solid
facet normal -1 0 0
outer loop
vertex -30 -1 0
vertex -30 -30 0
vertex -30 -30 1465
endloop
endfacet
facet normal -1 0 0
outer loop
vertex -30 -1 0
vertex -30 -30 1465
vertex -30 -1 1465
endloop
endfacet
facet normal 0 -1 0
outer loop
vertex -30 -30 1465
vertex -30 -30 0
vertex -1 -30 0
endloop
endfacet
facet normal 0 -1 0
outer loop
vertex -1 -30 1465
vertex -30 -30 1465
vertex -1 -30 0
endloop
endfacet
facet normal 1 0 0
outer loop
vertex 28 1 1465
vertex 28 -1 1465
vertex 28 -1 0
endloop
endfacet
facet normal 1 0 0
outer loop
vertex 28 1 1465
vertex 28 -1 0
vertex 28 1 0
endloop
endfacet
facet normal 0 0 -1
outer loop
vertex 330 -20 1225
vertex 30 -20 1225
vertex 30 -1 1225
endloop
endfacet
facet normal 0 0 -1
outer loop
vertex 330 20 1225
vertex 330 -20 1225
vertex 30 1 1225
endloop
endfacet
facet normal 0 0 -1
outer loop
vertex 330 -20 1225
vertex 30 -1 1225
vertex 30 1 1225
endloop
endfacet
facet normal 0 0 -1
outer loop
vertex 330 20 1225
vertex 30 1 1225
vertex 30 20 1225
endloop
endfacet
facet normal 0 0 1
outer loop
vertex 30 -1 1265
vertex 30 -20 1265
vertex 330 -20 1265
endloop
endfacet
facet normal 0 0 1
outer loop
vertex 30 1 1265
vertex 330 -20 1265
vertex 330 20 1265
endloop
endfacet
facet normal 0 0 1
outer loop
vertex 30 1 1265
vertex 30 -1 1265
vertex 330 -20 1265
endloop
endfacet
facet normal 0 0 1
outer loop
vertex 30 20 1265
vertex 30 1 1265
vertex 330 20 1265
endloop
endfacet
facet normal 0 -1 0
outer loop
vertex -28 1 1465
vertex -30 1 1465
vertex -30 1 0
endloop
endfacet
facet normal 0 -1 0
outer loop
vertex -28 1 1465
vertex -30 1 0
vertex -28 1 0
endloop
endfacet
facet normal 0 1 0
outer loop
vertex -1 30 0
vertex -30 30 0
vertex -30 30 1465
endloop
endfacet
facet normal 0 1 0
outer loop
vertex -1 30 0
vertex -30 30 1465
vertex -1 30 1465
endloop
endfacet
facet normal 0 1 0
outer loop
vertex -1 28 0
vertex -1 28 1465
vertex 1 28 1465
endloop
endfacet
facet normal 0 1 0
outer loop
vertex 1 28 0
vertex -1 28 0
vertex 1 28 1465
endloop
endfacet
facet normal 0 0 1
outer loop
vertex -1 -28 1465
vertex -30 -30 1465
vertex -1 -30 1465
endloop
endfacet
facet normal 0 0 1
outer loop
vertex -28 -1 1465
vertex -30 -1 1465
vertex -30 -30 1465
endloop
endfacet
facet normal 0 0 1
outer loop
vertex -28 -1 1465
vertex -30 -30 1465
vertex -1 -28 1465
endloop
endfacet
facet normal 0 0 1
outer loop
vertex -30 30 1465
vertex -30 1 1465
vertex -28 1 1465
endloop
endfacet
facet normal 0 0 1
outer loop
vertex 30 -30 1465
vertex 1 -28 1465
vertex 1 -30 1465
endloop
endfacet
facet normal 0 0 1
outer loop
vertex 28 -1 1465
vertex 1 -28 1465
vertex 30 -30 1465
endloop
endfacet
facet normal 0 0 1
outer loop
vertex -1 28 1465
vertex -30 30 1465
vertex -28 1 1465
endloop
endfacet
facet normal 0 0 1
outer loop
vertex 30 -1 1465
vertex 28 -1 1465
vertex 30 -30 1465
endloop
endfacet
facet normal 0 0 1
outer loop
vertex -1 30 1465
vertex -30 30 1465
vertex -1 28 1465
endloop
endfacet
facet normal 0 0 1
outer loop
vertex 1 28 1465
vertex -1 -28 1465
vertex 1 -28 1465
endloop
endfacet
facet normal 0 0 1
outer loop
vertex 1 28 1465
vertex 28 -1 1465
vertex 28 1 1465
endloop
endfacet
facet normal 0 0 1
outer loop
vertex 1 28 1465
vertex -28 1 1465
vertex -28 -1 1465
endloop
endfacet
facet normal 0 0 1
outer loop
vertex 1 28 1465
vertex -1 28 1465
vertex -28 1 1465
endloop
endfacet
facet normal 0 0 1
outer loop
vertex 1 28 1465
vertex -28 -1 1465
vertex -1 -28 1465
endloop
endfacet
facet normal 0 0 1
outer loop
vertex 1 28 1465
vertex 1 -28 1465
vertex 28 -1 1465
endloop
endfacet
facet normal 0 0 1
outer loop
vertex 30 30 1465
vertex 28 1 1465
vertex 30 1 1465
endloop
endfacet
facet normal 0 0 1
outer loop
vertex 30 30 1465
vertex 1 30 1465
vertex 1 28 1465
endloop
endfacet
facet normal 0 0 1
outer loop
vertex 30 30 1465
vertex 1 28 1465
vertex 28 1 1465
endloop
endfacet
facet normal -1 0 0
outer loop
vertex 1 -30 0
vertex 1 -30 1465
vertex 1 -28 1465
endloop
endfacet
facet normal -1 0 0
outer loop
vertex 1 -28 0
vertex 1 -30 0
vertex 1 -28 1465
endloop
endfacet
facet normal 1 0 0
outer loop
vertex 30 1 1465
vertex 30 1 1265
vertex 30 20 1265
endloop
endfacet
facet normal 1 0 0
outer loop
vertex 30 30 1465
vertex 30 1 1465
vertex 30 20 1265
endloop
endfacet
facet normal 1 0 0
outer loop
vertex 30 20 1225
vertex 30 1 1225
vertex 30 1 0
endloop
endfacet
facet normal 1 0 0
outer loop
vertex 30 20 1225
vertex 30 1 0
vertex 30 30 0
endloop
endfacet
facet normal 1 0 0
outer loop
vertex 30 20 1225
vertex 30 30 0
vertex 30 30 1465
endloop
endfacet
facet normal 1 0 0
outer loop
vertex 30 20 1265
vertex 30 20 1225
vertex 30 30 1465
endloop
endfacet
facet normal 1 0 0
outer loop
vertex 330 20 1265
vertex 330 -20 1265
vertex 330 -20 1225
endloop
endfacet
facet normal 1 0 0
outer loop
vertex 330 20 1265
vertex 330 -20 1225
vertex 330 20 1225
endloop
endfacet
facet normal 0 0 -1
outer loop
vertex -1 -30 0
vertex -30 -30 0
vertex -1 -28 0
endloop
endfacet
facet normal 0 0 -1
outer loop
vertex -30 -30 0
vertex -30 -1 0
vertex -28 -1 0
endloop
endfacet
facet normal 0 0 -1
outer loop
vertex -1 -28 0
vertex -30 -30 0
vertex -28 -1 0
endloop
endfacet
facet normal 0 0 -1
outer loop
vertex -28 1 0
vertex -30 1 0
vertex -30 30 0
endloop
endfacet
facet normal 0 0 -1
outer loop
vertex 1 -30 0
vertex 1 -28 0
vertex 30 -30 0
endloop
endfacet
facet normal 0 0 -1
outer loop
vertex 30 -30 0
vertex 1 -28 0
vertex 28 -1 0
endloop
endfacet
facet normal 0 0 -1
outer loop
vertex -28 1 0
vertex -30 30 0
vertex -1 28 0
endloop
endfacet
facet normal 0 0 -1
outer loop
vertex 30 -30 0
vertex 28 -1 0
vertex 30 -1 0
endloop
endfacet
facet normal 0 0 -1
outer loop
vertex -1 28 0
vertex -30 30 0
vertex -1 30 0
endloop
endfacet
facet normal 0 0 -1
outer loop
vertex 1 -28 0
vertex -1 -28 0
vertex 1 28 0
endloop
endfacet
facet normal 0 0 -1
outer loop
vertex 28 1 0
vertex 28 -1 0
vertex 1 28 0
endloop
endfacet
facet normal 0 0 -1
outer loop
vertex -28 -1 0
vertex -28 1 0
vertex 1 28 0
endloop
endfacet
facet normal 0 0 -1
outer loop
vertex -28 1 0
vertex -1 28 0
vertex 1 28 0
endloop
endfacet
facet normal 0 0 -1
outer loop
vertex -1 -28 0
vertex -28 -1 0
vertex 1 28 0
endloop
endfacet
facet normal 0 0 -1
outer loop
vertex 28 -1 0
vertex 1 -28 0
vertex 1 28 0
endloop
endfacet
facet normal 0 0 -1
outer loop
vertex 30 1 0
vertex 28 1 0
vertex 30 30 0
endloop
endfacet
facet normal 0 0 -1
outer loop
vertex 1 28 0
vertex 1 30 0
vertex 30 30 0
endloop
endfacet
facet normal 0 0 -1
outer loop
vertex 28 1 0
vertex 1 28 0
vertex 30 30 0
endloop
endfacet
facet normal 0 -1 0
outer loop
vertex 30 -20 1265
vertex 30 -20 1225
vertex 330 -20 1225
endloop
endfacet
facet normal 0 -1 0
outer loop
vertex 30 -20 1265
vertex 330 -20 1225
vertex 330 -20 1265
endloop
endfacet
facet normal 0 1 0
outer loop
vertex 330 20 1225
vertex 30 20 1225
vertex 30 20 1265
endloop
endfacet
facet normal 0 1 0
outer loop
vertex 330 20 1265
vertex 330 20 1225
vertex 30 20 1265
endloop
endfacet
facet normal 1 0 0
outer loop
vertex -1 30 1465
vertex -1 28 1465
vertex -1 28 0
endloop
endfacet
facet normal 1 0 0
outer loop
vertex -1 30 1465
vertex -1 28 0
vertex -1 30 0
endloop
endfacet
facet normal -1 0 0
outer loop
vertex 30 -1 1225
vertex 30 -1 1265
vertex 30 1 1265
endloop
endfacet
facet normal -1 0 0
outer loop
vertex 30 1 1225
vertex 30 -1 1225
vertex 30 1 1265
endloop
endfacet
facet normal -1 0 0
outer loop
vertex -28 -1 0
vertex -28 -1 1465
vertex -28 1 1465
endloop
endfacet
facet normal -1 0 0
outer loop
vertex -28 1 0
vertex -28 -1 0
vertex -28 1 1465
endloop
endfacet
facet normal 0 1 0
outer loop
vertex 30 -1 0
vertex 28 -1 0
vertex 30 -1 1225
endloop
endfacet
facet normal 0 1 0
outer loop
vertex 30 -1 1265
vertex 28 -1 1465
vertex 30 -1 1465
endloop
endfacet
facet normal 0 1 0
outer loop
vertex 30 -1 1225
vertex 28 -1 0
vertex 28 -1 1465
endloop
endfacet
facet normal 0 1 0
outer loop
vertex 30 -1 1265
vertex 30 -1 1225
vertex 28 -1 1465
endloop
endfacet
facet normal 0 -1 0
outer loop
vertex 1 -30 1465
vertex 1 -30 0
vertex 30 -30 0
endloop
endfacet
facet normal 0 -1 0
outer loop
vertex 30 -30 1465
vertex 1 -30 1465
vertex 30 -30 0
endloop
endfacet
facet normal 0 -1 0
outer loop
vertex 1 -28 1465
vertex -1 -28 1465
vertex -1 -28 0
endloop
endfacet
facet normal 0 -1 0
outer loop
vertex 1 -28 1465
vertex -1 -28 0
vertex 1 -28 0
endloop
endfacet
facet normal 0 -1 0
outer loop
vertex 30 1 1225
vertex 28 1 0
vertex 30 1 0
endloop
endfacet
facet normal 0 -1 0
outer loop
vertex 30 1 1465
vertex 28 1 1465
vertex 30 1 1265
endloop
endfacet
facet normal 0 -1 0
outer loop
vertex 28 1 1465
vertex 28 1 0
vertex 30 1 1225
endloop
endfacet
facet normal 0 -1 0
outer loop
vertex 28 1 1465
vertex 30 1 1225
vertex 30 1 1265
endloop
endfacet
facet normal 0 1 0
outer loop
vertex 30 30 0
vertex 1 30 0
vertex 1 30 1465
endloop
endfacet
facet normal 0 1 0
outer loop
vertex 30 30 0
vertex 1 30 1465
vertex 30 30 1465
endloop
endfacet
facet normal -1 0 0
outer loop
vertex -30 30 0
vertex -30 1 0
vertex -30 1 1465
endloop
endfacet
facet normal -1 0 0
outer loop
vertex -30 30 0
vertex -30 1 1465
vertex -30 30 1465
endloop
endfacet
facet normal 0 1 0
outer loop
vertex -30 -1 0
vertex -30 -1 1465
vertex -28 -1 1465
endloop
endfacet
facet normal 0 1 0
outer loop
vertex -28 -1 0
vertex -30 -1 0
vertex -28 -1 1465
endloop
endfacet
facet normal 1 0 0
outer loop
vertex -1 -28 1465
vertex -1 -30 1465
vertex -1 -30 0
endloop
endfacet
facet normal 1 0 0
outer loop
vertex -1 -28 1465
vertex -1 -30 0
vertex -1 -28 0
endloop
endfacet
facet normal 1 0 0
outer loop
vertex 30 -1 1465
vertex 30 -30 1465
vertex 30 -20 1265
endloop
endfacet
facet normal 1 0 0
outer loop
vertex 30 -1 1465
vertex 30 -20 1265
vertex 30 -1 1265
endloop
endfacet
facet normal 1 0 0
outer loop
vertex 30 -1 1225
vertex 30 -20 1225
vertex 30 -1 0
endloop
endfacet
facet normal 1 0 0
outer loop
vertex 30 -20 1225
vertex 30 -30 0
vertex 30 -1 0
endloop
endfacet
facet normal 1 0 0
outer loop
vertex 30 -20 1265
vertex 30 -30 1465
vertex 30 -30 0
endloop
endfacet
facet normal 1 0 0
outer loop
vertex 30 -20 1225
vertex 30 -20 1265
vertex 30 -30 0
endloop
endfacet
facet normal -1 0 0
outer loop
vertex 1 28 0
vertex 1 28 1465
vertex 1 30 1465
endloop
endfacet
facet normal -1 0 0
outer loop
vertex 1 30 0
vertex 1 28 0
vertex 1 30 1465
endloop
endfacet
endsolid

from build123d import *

# Parameters (mm, degrees)
F0_W     = 60
F0_H     = 60
F1_DEPTH = 1465
F2_W     = 2
F2_H     = 2
F3_DEPTH = 1465
F4_W     = 40
F4_H     = 40
F5_DEPTH = 300


with BuildPart() as f1:
    # F0 (on Top) → F1 (new body)
    with BuildSketch(Plane.XY):
        Rectangle(F0_W, F0_H)
    extrude(amount=F1_DEPTH)

    # F2 (on face) → F3 (cut, through all)
    with BuildSketch(Plane.XY.offset(1465)):
        with Locations((0, 29)):
            Rectangle(F2_W, F2_H)
        with Locations((-29, 0)):
            Rectangle(F2_W, F2_H)
        with Locations((0, -29)):
            Rectangle(F2_W, F2_H)
        with Locations((29, 0)):
            Rectangle(F2_W, F2_H)
    extrude(amount=-F3_DEPTH, mode=Mode.SUBTRACT)

    # F4 (on face) → F5 (join)
    with BuildSketch(Plane.YZ.offset(30)):
        with Locations((0, 1245)):
            Rectangle(F4_W, F4_H)
    extrude(amount=F5_DEPTH)


solid = f1.part
